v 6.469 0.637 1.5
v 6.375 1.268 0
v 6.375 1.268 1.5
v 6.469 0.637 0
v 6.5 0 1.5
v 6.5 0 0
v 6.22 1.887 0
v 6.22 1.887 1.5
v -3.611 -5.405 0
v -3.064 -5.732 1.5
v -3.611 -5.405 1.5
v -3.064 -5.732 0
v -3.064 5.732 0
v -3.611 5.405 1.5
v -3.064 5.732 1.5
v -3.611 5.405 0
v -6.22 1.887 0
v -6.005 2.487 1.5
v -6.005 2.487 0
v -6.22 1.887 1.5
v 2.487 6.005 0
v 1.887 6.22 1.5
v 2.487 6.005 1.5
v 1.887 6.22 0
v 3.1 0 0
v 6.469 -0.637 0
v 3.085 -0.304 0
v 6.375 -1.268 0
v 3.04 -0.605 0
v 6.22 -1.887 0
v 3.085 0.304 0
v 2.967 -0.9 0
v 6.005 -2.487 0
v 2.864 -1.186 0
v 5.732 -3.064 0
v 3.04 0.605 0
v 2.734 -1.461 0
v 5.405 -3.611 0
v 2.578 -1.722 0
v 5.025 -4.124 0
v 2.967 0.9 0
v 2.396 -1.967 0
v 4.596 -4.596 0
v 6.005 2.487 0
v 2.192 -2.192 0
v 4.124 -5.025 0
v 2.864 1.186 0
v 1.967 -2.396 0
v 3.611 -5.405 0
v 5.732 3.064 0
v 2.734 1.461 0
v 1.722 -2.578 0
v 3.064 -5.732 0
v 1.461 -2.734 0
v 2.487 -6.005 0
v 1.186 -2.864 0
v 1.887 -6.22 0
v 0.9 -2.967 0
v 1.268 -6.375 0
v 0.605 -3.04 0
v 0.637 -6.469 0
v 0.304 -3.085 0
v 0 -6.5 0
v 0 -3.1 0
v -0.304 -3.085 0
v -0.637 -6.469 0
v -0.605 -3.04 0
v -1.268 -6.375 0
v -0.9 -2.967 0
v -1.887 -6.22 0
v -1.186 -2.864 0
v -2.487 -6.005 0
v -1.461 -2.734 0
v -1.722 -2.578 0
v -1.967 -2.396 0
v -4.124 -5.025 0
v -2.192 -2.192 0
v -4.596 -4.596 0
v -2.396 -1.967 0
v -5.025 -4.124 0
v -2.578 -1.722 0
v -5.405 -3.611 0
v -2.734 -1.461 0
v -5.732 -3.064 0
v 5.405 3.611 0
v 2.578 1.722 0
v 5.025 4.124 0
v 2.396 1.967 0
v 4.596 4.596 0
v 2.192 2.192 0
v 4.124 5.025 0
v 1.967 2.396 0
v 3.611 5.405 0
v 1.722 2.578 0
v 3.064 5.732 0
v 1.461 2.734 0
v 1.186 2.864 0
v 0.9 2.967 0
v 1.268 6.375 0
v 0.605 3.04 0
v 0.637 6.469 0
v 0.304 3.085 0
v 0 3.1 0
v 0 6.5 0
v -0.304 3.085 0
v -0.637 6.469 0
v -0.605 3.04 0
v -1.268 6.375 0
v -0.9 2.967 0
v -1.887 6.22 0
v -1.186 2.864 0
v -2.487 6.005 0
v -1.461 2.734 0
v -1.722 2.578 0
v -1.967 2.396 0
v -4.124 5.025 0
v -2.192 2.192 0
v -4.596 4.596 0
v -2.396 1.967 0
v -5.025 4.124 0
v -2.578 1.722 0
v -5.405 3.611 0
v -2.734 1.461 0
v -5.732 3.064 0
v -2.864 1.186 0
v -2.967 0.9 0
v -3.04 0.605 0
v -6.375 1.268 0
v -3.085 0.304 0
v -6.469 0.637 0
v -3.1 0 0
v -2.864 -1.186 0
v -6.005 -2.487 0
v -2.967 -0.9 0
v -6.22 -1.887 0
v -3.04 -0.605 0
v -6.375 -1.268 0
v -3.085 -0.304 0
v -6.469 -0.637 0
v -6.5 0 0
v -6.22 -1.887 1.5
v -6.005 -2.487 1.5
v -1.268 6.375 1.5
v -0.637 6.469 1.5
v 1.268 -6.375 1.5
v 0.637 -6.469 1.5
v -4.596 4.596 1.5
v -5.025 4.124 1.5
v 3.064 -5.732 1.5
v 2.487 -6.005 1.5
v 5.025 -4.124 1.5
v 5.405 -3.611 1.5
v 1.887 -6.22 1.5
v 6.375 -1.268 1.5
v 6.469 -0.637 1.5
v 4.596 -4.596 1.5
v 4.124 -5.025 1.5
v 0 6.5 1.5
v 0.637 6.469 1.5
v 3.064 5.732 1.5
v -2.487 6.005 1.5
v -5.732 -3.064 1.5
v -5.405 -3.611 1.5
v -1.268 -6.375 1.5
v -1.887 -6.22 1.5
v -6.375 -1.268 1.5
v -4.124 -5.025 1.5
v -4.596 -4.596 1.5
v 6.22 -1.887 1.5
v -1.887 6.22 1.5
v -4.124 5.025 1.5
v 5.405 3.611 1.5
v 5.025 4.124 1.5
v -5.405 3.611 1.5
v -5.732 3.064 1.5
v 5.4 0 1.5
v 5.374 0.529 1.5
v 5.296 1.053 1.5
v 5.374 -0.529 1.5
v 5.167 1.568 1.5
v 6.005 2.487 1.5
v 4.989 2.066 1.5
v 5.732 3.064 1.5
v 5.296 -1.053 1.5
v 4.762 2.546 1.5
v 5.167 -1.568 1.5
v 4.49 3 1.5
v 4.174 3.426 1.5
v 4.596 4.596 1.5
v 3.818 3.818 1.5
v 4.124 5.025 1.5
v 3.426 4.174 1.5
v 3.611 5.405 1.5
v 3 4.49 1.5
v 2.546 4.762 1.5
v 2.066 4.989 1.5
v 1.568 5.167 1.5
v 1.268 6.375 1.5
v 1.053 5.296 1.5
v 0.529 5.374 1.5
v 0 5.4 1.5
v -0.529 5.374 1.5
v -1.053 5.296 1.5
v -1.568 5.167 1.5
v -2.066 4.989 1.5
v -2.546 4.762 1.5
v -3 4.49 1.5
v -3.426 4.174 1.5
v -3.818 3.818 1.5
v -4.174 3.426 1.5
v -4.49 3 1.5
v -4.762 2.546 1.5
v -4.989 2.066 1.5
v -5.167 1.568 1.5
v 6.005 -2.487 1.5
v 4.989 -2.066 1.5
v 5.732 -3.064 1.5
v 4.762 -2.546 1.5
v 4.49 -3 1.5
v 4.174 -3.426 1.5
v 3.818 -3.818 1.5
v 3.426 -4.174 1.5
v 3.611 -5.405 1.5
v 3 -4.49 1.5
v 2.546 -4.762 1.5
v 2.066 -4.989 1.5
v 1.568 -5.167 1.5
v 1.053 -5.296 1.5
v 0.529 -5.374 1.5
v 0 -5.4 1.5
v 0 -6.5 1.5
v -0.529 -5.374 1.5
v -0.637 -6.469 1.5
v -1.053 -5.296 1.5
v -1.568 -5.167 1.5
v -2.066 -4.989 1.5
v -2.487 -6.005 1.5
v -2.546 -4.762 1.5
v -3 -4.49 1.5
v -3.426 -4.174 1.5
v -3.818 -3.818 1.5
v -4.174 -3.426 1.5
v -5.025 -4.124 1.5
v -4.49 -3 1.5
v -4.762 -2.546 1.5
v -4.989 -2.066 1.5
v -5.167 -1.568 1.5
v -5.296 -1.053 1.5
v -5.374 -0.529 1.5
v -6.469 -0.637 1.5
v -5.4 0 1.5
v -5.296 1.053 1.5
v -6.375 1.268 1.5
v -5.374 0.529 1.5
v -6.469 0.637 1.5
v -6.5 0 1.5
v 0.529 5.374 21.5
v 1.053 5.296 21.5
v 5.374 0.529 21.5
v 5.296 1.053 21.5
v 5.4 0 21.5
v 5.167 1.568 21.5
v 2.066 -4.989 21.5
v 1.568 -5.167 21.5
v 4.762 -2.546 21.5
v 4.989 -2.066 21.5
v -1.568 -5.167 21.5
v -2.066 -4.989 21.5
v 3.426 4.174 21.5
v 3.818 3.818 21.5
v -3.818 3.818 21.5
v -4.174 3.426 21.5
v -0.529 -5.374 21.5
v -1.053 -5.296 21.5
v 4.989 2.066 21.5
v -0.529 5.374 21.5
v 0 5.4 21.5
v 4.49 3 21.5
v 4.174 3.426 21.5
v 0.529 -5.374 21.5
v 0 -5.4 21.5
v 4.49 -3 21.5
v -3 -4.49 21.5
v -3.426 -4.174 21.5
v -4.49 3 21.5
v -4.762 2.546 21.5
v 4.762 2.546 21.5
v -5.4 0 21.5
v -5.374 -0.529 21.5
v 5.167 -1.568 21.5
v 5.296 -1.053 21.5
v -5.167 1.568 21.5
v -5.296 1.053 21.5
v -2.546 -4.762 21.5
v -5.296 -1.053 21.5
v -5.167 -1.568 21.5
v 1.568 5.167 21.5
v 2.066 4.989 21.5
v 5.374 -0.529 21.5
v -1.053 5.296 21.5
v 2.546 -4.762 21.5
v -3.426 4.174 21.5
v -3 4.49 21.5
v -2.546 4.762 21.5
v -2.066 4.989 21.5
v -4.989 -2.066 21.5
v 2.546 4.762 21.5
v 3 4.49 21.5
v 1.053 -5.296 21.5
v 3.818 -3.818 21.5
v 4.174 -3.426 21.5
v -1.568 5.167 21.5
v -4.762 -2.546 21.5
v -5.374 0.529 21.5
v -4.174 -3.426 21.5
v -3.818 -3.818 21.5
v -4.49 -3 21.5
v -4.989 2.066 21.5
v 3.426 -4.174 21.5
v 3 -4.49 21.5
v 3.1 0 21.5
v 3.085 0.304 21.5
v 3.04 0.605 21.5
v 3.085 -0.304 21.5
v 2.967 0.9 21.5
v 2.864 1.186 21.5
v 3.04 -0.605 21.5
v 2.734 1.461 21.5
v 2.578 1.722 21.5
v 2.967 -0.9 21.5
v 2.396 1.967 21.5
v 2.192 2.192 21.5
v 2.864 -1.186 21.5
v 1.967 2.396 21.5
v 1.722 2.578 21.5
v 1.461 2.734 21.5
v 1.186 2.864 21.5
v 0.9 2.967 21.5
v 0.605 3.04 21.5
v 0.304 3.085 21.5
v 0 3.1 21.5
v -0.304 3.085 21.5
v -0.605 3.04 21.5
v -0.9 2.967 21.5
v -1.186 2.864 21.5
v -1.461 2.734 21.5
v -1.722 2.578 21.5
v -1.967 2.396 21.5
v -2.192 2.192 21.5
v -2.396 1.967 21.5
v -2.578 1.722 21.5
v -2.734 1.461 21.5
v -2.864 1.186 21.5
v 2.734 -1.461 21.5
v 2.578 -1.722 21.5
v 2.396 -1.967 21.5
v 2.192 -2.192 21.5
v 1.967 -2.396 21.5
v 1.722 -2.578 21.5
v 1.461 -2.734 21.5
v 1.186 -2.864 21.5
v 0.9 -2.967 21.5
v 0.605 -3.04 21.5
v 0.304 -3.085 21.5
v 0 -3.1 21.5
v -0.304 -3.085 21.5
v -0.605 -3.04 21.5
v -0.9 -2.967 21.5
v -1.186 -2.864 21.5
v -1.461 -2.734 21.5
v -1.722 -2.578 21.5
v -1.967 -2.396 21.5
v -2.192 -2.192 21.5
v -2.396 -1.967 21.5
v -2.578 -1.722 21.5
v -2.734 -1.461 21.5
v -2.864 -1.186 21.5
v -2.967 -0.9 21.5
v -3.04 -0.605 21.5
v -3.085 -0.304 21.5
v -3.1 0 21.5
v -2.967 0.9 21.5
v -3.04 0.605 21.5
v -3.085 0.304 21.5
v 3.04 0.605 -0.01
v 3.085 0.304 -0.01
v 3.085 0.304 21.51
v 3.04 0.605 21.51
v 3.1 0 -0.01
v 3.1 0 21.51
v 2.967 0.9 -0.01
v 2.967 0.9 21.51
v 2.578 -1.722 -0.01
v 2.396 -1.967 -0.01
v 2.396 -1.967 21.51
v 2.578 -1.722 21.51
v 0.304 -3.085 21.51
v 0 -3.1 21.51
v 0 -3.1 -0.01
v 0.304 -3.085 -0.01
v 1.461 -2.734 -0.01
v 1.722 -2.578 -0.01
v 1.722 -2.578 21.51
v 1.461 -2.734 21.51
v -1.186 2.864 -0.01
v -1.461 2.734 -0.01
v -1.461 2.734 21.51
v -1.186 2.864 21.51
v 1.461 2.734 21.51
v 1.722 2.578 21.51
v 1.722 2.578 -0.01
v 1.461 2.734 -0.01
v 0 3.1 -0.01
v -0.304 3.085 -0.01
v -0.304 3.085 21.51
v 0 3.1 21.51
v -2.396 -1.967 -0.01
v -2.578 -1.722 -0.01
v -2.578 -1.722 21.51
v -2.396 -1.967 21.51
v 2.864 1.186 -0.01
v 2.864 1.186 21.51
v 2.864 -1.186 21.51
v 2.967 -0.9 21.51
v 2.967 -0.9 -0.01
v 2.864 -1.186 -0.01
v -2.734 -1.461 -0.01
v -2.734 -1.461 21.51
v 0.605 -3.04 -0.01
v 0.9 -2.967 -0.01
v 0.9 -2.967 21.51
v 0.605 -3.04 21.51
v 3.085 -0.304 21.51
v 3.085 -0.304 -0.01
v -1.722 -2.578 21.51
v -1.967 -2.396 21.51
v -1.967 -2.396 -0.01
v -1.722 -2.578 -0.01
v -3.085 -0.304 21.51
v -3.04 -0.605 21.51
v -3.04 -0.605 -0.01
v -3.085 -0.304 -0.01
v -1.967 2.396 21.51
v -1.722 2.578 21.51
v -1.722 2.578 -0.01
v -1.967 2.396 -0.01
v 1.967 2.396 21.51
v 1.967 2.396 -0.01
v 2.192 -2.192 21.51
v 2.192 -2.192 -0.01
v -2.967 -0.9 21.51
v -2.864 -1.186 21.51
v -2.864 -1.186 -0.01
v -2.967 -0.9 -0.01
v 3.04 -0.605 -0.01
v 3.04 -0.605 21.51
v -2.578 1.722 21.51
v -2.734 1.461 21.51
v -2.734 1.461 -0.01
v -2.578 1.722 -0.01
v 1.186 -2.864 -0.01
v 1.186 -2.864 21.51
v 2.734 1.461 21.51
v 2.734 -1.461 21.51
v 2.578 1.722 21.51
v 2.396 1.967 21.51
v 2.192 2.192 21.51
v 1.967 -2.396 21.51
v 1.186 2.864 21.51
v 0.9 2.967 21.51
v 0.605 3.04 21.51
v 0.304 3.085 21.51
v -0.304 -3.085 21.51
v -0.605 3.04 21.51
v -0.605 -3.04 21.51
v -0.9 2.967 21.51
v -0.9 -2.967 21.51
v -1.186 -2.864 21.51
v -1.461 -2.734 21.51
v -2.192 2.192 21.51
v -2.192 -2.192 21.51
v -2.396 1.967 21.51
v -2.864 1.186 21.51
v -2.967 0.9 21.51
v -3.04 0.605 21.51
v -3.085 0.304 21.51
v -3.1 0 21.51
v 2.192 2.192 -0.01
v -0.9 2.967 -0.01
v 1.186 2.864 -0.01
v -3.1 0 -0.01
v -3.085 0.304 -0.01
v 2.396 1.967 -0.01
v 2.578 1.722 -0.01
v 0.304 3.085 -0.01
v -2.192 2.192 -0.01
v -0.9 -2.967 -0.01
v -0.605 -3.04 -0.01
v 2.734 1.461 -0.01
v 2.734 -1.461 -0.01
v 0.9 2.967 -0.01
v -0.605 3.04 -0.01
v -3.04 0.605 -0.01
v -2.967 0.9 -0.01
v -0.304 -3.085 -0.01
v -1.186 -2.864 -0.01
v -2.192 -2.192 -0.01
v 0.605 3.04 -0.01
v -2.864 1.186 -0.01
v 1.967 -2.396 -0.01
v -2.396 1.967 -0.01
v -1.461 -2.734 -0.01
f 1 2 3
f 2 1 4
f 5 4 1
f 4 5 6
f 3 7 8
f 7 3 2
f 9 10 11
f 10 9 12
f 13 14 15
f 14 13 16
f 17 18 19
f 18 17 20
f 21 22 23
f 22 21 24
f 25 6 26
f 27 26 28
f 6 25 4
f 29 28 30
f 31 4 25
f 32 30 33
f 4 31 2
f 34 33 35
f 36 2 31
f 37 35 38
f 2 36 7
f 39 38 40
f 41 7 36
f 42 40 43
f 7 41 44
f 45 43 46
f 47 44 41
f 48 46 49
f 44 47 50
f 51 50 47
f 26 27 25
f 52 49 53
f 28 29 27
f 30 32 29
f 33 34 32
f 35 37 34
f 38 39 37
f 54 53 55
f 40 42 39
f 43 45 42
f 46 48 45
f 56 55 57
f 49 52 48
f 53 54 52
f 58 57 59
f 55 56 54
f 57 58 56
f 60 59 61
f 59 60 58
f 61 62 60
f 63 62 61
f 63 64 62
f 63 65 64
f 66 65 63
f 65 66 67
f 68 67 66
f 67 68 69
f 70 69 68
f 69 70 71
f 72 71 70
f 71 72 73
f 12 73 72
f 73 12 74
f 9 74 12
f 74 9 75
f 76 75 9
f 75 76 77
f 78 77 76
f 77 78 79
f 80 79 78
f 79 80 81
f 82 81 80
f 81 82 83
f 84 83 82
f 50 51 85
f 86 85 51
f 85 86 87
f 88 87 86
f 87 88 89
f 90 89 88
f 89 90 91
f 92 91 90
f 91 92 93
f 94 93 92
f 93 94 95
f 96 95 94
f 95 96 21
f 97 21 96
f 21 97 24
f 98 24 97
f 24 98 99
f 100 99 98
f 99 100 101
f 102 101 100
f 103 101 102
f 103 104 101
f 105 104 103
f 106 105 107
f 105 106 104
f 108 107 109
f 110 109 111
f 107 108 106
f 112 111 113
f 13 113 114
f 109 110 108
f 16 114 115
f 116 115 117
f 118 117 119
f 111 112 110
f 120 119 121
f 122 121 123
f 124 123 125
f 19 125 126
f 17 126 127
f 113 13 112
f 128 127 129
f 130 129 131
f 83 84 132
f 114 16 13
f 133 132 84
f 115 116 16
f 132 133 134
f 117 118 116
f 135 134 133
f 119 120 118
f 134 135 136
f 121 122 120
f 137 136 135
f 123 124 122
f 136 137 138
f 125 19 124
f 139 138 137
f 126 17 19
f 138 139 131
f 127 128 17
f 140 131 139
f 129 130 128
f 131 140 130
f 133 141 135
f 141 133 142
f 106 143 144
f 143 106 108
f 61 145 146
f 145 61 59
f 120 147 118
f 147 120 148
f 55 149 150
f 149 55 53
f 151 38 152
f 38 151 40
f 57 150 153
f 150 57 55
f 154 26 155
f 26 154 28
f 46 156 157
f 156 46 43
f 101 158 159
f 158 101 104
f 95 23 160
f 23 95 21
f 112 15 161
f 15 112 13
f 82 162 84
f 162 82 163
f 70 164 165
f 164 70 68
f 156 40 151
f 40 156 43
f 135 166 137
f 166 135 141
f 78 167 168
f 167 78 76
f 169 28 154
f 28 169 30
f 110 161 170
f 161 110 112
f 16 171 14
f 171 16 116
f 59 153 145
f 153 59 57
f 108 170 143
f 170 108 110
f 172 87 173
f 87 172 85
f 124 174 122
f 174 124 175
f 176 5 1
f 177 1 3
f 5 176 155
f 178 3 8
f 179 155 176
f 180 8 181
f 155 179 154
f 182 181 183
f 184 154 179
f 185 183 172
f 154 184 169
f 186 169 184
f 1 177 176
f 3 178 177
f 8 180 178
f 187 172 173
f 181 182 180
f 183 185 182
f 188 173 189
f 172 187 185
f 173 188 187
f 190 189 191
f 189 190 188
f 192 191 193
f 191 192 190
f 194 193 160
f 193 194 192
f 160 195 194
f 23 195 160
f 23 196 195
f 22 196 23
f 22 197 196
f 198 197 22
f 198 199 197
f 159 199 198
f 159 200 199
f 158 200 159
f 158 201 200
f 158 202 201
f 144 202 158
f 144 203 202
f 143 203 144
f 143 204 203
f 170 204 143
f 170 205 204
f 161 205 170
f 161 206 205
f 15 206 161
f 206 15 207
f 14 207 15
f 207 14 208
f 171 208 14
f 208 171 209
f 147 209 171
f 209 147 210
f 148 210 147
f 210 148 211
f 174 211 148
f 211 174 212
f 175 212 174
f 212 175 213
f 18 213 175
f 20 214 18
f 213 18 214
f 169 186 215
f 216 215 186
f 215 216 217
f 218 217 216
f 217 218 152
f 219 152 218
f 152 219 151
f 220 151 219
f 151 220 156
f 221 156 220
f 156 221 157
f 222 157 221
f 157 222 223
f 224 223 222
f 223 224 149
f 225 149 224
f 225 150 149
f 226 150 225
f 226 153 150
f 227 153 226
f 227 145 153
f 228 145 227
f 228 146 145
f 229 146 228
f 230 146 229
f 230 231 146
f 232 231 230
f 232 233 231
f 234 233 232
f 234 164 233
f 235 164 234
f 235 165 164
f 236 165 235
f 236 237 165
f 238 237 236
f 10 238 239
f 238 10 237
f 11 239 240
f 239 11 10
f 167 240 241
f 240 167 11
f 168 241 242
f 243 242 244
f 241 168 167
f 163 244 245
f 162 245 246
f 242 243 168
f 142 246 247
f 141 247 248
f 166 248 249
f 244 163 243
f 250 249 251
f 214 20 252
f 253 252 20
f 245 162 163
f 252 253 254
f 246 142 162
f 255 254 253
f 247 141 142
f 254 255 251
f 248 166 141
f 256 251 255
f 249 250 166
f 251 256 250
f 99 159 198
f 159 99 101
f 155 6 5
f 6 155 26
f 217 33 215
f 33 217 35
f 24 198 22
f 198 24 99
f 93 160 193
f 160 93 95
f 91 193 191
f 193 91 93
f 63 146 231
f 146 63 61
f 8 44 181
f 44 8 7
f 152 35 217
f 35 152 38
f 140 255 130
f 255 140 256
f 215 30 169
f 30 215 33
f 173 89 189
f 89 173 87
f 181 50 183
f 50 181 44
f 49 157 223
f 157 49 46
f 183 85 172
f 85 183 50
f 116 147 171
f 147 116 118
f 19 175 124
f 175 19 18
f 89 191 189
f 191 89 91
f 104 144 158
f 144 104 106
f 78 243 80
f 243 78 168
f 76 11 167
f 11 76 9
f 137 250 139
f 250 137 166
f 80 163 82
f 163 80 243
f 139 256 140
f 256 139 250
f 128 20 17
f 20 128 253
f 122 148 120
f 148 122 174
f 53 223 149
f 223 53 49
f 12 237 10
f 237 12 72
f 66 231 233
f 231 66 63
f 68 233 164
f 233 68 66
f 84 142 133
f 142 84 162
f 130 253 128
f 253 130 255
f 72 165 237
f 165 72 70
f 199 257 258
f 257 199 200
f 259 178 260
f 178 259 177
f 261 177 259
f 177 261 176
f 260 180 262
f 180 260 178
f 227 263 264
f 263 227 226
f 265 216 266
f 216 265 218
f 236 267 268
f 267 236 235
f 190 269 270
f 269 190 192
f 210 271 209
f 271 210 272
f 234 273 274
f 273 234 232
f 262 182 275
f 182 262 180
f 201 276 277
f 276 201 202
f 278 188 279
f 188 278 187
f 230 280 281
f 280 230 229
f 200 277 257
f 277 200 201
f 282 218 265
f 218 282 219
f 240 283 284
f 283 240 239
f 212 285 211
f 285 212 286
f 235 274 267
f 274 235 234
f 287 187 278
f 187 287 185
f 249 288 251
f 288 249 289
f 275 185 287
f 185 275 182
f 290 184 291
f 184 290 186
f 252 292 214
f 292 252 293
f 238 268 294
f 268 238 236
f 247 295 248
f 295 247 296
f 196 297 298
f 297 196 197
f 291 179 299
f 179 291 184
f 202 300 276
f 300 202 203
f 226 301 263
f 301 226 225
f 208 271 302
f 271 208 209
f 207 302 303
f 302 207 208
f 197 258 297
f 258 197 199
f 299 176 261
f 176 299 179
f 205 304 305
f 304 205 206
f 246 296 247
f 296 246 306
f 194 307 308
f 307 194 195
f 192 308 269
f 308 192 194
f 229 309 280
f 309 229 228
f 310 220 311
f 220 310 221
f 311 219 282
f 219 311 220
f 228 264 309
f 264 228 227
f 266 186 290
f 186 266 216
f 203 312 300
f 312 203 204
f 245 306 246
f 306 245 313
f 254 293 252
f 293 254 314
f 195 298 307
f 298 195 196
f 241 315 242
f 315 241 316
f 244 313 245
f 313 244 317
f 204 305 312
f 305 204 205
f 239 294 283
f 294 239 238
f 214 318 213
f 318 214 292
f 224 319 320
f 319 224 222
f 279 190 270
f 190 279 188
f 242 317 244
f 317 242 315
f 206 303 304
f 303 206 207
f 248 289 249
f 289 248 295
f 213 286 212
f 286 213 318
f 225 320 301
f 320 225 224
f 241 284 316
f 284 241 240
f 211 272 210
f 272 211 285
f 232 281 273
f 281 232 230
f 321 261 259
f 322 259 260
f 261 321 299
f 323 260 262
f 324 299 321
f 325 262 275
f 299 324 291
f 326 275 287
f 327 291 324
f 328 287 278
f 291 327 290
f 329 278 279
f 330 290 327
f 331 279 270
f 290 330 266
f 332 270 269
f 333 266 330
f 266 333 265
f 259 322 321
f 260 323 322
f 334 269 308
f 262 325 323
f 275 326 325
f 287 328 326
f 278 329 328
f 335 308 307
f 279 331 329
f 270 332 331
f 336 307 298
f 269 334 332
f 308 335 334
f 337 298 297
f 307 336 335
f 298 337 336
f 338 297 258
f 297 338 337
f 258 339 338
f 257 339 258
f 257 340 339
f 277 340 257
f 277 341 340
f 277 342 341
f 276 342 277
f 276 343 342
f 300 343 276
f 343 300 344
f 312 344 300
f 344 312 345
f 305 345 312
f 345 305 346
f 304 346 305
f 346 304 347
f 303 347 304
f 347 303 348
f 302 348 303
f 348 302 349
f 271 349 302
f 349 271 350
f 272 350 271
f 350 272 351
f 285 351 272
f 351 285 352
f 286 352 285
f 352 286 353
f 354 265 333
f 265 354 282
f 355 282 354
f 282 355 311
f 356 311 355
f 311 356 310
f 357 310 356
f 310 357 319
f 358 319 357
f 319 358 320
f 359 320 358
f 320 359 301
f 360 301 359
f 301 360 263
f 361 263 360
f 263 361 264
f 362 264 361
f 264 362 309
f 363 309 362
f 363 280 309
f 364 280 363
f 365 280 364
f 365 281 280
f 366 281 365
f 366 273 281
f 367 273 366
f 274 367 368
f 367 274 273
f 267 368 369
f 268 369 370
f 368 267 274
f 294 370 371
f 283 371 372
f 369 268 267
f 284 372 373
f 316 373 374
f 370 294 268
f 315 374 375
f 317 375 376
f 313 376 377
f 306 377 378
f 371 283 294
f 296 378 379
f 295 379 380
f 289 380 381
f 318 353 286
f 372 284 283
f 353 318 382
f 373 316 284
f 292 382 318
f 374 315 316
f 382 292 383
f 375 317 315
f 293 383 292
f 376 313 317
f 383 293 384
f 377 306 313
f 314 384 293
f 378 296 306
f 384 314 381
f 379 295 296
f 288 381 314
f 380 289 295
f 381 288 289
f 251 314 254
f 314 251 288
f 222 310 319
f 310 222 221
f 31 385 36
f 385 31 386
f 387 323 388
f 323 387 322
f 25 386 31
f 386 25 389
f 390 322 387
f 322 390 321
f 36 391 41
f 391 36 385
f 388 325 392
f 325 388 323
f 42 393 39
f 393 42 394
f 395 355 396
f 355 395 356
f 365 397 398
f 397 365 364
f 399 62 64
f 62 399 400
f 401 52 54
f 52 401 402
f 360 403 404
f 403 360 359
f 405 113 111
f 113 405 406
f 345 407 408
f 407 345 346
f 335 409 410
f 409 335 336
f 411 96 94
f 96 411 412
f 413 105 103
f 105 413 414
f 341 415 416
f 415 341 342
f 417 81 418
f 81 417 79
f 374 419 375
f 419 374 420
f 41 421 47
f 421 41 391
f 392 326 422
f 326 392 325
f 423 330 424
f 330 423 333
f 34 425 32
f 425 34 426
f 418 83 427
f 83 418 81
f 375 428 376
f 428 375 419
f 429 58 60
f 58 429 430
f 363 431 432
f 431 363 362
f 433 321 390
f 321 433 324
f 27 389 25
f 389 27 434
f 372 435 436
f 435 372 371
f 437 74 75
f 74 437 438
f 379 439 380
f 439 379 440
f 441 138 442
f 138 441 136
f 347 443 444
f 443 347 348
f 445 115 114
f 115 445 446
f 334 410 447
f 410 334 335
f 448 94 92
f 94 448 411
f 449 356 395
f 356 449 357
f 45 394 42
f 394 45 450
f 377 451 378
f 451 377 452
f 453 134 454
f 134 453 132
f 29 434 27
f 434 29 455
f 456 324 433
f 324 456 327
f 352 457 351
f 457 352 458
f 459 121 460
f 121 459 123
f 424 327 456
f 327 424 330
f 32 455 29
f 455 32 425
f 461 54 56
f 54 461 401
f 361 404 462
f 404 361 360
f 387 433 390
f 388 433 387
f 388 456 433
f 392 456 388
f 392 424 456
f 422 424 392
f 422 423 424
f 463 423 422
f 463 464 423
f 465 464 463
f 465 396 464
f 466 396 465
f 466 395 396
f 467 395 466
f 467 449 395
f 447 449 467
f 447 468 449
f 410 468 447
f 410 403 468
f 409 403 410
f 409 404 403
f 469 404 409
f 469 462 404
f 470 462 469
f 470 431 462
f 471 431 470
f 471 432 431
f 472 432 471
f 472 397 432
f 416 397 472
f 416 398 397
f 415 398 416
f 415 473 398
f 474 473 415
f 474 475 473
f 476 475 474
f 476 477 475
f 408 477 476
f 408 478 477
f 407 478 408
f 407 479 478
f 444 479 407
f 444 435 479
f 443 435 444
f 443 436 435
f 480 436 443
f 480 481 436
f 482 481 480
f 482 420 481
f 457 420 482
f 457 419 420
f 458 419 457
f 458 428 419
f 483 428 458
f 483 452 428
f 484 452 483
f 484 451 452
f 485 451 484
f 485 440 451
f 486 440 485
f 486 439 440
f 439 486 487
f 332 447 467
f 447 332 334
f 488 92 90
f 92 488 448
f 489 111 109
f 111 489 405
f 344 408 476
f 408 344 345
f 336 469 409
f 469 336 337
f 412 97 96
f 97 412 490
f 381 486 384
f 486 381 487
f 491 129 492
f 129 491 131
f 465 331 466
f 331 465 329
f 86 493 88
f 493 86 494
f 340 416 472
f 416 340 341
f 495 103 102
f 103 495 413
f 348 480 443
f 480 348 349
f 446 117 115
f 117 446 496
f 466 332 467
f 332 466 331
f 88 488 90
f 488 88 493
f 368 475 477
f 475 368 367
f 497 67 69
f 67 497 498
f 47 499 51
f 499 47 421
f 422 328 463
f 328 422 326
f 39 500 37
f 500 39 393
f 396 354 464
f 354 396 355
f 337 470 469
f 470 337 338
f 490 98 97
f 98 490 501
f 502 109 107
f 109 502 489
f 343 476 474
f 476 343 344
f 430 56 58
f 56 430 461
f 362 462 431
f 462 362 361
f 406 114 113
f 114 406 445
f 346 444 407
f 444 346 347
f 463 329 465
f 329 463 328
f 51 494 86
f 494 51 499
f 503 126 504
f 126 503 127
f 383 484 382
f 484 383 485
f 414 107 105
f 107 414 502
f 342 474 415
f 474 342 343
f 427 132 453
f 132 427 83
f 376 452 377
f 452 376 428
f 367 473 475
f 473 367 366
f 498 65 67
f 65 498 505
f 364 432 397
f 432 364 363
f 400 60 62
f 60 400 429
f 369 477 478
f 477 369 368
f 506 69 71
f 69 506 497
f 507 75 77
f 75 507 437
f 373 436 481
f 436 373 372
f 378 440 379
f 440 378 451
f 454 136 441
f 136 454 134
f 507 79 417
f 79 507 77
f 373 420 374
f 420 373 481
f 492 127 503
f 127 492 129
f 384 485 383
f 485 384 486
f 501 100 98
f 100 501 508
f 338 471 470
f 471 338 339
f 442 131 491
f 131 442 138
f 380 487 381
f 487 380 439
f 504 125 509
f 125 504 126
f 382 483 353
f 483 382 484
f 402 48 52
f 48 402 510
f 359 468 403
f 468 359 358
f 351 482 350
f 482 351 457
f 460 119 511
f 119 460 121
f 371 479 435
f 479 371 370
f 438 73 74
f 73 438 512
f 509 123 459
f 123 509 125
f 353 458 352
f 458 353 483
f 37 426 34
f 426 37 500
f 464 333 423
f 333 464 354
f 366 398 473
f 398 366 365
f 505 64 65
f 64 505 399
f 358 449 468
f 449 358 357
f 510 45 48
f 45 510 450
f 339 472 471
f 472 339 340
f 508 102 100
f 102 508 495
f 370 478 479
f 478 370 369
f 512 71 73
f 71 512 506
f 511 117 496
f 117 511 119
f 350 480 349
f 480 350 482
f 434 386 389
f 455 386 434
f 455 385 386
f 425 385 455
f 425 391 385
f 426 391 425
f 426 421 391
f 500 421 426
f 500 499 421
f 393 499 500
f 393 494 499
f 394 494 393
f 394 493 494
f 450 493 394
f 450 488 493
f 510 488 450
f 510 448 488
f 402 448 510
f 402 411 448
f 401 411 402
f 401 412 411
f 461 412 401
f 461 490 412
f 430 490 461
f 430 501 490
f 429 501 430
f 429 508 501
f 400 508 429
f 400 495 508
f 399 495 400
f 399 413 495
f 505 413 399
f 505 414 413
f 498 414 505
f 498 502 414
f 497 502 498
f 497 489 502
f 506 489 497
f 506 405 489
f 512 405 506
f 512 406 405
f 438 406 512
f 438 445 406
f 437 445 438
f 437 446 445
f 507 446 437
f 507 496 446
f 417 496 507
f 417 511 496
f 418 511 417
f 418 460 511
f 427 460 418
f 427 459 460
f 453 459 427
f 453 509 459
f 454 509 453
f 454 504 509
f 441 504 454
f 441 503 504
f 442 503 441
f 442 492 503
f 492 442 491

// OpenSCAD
// PCR tube adapter sleeve for 0.2 mL tube in 1.5 mL rack hole
// Print upside down: collar on bed, sleeve body upward

// Dimensions
collar_diameter = 13;        // Outer diameter of collar
collar_height = 1.5;         // Height of collar
sleeve_outer_diameter = 10.8; // Outer diameter of sleeve body
sleeve_height = 21.5;      // Total height of sleeve (from collar base)
bore_diameter = 6.2;         // Diameter of central bore

// Main body
union() {
  // Collar
  cylinder(h = collar_height, d = collar_diameter, center = false, $fn = 64);
  
  // Sleeve body
  translate([0, 0, collar_height]) 
    cylinder(h = sleeve_height - collar_height, d = sleeve_outer_diameter, center = false, $fn = 64);
  
  // Central bore
  translate([0, 0, -0.01]) 
    cylinder(h = sleeve_height + 0.02, d = bore_diameter, center = false, $fn = 64);
}
